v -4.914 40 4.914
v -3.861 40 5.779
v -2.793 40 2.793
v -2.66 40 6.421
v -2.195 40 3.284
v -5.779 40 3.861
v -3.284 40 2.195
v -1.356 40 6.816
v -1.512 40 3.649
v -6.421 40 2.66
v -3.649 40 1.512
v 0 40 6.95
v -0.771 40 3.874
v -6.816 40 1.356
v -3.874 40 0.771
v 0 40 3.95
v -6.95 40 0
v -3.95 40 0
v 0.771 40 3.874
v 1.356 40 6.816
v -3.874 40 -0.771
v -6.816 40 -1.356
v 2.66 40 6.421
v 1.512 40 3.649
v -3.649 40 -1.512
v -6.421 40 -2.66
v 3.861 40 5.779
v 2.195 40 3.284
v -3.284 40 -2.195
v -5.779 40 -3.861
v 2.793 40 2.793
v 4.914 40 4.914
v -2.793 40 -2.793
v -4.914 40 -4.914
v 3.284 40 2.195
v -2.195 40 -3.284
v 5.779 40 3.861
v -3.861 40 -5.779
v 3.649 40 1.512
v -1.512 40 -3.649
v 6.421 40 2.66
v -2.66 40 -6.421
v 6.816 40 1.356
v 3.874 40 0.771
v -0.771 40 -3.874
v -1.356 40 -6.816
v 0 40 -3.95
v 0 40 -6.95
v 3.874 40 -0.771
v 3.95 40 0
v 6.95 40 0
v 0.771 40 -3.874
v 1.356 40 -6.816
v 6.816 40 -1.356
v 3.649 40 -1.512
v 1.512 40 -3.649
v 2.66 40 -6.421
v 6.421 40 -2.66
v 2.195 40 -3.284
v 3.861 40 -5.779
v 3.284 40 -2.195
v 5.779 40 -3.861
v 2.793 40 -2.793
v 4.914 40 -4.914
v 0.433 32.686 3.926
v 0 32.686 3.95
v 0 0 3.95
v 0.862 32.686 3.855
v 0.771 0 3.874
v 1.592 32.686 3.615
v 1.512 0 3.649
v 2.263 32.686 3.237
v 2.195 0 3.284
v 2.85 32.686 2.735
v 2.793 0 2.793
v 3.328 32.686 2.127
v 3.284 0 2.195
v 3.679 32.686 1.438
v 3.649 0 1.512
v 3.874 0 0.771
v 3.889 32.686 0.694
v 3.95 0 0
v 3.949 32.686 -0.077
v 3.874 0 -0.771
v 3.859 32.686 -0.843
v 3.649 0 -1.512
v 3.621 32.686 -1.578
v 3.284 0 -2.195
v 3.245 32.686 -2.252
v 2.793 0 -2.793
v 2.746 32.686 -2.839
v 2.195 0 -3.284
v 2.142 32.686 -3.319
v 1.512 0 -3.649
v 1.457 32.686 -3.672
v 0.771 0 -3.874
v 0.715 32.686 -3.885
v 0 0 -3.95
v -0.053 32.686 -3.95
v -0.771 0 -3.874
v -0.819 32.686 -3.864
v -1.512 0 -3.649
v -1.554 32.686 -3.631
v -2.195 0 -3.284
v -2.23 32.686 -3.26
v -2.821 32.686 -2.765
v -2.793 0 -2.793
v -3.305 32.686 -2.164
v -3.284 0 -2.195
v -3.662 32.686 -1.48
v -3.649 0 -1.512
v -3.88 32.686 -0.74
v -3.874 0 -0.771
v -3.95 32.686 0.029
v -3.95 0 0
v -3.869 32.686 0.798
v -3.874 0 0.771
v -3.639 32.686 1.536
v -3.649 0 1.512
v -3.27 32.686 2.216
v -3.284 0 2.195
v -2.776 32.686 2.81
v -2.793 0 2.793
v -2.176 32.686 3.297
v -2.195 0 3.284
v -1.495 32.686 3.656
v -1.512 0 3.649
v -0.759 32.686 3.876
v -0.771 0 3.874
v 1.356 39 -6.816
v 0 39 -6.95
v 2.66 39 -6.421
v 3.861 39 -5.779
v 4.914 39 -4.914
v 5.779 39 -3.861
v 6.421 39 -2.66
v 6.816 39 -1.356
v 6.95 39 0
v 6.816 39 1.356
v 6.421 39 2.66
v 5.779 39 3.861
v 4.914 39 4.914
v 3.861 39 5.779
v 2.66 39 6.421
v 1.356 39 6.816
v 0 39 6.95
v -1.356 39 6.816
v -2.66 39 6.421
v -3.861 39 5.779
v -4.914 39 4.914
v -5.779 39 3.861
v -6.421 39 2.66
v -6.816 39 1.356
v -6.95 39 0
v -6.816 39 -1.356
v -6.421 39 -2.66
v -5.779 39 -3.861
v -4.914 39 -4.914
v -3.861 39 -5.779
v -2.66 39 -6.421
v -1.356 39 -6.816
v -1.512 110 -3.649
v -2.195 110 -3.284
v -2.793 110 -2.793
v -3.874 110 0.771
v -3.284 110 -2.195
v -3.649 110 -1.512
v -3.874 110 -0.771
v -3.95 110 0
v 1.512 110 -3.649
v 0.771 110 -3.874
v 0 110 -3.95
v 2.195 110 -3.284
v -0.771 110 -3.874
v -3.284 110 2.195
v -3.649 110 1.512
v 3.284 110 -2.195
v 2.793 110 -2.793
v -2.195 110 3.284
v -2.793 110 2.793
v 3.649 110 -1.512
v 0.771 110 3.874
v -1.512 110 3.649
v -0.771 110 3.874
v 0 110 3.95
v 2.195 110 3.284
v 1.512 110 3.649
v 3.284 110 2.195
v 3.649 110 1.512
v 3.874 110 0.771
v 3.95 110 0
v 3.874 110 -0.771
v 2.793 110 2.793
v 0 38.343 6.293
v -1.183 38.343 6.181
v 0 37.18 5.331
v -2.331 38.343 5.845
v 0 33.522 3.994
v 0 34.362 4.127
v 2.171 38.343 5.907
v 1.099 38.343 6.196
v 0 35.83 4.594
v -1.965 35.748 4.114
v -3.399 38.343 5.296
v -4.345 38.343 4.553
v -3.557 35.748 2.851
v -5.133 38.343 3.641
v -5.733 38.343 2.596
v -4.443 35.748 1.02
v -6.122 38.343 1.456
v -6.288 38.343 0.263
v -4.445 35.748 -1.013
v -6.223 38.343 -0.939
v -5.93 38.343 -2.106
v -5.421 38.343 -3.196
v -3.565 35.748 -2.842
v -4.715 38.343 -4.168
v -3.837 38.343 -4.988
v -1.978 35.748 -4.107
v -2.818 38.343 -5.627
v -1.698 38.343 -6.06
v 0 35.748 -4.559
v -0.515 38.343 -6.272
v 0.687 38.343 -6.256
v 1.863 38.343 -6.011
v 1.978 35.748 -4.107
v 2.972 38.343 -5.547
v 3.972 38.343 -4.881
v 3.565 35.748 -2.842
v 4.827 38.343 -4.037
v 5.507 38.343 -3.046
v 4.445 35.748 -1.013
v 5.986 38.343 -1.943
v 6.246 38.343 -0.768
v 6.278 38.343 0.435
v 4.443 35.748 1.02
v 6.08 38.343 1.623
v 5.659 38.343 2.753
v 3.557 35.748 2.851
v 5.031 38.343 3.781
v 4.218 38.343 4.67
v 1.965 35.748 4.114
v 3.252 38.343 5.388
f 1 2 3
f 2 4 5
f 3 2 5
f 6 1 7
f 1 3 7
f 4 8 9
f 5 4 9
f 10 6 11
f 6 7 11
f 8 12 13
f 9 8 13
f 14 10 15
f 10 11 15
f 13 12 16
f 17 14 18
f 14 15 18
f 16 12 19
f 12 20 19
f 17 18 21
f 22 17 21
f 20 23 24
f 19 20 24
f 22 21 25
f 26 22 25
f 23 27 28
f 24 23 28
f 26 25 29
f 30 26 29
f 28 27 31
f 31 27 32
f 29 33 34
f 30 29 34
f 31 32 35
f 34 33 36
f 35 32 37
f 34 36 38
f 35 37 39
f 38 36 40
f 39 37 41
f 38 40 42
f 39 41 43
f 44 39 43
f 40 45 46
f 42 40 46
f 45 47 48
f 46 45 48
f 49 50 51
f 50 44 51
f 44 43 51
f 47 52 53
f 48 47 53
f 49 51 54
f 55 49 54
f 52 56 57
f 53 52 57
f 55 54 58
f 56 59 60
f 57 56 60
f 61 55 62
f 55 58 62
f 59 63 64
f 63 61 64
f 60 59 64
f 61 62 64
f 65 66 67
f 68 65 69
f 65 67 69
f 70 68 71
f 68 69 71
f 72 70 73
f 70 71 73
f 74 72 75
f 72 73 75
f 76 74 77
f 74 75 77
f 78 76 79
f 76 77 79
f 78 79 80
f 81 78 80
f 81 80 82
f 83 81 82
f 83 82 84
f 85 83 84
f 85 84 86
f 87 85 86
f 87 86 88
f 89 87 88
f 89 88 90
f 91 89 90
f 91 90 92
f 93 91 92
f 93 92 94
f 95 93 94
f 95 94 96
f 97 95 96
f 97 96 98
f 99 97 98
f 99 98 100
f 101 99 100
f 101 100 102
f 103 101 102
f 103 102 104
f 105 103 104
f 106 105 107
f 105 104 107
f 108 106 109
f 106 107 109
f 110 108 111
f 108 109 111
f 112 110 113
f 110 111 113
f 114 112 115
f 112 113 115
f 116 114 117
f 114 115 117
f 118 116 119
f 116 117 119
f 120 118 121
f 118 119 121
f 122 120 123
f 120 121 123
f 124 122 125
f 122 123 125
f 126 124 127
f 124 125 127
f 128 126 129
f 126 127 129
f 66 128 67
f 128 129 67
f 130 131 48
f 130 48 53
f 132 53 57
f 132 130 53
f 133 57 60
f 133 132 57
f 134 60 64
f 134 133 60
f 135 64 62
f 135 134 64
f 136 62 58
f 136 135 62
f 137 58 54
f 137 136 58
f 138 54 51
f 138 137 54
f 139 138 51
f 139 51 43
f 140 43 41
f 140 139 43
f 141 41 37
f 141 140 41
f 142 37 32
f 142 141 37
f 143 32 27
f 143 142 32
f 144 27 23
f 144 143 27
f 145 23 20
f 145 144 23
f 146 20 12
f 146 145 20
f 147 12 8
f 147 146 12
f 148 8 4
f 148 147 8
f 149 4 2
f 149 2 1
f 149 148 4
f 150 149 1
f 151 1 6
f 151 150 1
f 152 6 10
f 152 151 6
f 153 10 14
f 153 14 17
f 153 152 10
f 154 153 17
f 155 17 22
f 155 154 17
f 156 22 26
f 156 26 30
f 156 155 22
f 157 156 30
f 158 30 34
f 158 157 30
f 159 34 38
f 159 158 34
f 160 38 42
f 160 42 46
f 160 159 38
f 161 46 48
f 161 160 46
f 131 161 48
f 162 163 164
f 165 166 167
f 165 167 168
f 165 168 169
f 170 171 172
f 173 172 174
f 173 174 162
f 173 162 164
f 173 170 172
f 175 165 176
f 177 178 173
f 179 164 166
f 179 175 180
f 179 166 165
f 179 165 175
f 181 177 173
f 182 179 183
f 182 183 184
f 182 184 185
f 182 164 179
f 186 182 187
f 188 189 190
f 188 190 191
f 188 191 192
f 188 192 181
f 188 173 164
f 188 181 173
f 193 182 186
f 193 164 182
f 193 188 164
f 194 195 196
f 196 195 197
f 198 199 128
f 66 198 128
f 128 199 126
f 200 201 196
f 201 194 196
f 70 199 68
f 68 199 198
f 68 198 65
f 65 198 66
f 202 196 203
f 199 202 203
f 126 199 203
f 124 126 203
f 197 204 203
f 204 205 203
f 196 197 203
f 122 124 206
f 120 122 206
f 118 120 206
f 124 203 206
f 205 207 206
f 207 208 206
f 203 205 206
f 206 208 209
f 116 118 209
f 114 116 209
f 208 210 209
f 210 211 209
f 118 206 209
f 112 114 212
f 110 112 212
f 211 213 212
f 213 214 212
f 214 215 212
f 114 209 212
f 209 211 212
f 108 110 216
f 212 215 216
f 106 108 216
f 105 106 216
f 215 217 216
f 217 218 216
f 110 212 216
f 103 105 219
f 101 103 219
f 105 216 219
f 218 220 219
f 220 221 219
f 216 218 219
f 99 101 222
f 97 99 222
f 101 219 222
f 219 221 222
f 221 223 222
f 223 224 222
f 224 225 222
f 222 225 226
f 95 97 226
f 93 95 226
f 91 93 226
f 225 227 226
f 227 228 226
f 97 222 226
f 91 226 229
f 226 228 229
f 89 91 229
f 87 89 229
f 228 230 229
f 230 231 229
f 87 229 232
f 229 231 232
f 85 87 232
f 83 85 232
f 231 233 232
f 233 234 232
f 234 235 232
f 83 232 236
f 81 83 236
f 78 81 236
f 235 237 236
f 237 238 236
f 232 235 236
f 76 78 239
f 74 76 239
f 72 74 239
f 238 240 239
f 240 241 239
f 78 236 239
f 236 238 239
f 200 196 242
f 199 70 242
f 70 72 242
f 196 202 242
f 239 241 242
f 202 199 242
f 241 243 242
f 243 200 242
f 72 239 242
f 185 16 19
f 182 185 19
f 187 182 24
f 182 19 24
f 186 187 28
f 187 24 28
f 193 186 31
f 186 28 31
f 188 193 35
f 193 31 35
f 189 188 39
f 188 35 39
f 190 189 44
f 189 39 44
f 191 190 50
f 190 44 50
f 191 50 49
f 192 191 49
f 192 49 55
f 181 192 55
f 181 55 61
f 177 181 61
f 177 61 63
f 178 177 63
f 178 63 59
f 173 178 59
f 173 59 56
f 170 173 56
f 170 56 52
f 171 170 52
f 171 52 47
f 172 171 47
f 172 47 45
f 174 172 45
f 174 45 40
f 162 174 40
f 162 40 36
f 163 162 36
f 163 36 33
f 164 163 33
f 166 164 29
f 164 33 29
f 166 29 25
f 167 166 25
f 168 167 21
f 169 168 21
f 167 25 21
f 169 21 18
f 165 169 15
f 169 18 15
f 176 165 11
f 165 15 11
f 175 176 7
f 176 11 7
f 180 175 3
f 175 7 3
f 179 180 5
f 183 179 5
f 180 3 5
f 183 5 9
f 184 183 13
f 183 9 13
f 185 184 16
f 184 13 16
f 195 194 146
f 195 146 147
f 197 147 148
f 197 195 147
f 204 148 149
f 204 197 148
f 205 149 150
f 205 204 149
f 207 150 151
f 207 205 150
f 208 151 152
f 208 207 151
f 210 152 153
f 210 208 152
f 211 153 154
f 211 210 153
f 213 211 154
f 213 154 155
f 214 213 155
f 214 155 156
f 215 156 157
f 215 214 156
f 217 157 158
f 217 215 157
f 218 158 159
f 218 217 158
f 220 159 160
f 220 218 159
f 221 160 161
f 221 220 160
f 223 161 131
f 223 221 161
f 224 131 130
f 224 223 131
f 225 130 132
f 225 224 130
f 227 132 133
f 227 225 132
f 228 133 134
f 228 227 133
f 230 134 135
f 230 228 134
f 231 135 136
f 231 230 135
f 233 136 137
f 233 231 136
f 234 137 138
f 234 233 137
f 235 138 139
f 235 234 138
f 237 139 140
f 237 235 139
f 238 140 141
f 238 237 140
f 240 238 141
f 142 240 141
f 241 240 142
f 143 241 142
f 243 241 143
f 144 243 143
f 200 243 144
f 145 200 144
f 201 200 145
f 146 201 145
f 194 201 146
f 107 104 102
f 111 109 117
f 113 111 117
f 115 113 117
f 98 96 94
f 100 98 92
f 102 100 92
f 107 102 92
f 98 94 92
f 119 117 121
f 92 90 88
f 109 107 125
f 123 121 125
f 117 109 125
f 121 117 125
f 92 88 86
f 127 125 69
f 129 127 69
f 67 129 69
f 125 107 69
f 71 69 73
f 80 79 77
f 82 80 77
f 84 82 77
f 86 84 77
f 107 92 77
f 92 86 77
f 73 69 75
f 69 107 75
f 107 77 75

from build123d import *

# Parameters (mm, degrees)
SKETCH1_R           = 3.95
BOSS_EXTRUDE1_DEPTH = 110
SKETCH2_R           = 6.95
BOSS_EXTRUDE2_DEPTH = 1
CHAMFER1_SIZE       = 3
FILLET1_R           = 8


with BuildPart() as part:
    # Sketch1 → Boss-Extrude1 (new body)
    with BuildSketch(Plane(origin=(0, 0, 0), x_dir=(1, 0, 0), z_dir=(0, 1, 0))):
        with Locations(Location((0, 0, 0), (0, 0, 270))):
            Circle(SKETCH1_R)
    extrude(amount=BOSS_EXTRUDE1_DEPTH)

    # Sketch2 → Boss-Extrude2 (add)
    with BuildSketch(Plane(origin=(0, 39, 0), x_dir=(-1, 0, 0), z_dir=(0, -1, 0))):
        with Locations(Location((0, 0, 0), (0, 0, 90))):
            Circle(SKETCH2_R)
    extrude(amount=-BOSS_EXTRUDE2_DEPTH)

    # Chamfer1
    chamfer1_edges = [part.edges().sort_by_distance(p)[0] for p in [
        (0, 39, -3.95),
    ]]
    chamfer(chamfer1_edges, length=CHAMFER1_SIZE - 0.0001)  # a hair under: the kernel refuses the full size

    # Fillet1
    fillet1_edges = [part.edges().sort_by_distance(p)[0] for p in [
        (0, 36.0001, -3.95),
    ]]
    fillet(fillet1_edges, radius=FILLET1_R)


solid = part.part
